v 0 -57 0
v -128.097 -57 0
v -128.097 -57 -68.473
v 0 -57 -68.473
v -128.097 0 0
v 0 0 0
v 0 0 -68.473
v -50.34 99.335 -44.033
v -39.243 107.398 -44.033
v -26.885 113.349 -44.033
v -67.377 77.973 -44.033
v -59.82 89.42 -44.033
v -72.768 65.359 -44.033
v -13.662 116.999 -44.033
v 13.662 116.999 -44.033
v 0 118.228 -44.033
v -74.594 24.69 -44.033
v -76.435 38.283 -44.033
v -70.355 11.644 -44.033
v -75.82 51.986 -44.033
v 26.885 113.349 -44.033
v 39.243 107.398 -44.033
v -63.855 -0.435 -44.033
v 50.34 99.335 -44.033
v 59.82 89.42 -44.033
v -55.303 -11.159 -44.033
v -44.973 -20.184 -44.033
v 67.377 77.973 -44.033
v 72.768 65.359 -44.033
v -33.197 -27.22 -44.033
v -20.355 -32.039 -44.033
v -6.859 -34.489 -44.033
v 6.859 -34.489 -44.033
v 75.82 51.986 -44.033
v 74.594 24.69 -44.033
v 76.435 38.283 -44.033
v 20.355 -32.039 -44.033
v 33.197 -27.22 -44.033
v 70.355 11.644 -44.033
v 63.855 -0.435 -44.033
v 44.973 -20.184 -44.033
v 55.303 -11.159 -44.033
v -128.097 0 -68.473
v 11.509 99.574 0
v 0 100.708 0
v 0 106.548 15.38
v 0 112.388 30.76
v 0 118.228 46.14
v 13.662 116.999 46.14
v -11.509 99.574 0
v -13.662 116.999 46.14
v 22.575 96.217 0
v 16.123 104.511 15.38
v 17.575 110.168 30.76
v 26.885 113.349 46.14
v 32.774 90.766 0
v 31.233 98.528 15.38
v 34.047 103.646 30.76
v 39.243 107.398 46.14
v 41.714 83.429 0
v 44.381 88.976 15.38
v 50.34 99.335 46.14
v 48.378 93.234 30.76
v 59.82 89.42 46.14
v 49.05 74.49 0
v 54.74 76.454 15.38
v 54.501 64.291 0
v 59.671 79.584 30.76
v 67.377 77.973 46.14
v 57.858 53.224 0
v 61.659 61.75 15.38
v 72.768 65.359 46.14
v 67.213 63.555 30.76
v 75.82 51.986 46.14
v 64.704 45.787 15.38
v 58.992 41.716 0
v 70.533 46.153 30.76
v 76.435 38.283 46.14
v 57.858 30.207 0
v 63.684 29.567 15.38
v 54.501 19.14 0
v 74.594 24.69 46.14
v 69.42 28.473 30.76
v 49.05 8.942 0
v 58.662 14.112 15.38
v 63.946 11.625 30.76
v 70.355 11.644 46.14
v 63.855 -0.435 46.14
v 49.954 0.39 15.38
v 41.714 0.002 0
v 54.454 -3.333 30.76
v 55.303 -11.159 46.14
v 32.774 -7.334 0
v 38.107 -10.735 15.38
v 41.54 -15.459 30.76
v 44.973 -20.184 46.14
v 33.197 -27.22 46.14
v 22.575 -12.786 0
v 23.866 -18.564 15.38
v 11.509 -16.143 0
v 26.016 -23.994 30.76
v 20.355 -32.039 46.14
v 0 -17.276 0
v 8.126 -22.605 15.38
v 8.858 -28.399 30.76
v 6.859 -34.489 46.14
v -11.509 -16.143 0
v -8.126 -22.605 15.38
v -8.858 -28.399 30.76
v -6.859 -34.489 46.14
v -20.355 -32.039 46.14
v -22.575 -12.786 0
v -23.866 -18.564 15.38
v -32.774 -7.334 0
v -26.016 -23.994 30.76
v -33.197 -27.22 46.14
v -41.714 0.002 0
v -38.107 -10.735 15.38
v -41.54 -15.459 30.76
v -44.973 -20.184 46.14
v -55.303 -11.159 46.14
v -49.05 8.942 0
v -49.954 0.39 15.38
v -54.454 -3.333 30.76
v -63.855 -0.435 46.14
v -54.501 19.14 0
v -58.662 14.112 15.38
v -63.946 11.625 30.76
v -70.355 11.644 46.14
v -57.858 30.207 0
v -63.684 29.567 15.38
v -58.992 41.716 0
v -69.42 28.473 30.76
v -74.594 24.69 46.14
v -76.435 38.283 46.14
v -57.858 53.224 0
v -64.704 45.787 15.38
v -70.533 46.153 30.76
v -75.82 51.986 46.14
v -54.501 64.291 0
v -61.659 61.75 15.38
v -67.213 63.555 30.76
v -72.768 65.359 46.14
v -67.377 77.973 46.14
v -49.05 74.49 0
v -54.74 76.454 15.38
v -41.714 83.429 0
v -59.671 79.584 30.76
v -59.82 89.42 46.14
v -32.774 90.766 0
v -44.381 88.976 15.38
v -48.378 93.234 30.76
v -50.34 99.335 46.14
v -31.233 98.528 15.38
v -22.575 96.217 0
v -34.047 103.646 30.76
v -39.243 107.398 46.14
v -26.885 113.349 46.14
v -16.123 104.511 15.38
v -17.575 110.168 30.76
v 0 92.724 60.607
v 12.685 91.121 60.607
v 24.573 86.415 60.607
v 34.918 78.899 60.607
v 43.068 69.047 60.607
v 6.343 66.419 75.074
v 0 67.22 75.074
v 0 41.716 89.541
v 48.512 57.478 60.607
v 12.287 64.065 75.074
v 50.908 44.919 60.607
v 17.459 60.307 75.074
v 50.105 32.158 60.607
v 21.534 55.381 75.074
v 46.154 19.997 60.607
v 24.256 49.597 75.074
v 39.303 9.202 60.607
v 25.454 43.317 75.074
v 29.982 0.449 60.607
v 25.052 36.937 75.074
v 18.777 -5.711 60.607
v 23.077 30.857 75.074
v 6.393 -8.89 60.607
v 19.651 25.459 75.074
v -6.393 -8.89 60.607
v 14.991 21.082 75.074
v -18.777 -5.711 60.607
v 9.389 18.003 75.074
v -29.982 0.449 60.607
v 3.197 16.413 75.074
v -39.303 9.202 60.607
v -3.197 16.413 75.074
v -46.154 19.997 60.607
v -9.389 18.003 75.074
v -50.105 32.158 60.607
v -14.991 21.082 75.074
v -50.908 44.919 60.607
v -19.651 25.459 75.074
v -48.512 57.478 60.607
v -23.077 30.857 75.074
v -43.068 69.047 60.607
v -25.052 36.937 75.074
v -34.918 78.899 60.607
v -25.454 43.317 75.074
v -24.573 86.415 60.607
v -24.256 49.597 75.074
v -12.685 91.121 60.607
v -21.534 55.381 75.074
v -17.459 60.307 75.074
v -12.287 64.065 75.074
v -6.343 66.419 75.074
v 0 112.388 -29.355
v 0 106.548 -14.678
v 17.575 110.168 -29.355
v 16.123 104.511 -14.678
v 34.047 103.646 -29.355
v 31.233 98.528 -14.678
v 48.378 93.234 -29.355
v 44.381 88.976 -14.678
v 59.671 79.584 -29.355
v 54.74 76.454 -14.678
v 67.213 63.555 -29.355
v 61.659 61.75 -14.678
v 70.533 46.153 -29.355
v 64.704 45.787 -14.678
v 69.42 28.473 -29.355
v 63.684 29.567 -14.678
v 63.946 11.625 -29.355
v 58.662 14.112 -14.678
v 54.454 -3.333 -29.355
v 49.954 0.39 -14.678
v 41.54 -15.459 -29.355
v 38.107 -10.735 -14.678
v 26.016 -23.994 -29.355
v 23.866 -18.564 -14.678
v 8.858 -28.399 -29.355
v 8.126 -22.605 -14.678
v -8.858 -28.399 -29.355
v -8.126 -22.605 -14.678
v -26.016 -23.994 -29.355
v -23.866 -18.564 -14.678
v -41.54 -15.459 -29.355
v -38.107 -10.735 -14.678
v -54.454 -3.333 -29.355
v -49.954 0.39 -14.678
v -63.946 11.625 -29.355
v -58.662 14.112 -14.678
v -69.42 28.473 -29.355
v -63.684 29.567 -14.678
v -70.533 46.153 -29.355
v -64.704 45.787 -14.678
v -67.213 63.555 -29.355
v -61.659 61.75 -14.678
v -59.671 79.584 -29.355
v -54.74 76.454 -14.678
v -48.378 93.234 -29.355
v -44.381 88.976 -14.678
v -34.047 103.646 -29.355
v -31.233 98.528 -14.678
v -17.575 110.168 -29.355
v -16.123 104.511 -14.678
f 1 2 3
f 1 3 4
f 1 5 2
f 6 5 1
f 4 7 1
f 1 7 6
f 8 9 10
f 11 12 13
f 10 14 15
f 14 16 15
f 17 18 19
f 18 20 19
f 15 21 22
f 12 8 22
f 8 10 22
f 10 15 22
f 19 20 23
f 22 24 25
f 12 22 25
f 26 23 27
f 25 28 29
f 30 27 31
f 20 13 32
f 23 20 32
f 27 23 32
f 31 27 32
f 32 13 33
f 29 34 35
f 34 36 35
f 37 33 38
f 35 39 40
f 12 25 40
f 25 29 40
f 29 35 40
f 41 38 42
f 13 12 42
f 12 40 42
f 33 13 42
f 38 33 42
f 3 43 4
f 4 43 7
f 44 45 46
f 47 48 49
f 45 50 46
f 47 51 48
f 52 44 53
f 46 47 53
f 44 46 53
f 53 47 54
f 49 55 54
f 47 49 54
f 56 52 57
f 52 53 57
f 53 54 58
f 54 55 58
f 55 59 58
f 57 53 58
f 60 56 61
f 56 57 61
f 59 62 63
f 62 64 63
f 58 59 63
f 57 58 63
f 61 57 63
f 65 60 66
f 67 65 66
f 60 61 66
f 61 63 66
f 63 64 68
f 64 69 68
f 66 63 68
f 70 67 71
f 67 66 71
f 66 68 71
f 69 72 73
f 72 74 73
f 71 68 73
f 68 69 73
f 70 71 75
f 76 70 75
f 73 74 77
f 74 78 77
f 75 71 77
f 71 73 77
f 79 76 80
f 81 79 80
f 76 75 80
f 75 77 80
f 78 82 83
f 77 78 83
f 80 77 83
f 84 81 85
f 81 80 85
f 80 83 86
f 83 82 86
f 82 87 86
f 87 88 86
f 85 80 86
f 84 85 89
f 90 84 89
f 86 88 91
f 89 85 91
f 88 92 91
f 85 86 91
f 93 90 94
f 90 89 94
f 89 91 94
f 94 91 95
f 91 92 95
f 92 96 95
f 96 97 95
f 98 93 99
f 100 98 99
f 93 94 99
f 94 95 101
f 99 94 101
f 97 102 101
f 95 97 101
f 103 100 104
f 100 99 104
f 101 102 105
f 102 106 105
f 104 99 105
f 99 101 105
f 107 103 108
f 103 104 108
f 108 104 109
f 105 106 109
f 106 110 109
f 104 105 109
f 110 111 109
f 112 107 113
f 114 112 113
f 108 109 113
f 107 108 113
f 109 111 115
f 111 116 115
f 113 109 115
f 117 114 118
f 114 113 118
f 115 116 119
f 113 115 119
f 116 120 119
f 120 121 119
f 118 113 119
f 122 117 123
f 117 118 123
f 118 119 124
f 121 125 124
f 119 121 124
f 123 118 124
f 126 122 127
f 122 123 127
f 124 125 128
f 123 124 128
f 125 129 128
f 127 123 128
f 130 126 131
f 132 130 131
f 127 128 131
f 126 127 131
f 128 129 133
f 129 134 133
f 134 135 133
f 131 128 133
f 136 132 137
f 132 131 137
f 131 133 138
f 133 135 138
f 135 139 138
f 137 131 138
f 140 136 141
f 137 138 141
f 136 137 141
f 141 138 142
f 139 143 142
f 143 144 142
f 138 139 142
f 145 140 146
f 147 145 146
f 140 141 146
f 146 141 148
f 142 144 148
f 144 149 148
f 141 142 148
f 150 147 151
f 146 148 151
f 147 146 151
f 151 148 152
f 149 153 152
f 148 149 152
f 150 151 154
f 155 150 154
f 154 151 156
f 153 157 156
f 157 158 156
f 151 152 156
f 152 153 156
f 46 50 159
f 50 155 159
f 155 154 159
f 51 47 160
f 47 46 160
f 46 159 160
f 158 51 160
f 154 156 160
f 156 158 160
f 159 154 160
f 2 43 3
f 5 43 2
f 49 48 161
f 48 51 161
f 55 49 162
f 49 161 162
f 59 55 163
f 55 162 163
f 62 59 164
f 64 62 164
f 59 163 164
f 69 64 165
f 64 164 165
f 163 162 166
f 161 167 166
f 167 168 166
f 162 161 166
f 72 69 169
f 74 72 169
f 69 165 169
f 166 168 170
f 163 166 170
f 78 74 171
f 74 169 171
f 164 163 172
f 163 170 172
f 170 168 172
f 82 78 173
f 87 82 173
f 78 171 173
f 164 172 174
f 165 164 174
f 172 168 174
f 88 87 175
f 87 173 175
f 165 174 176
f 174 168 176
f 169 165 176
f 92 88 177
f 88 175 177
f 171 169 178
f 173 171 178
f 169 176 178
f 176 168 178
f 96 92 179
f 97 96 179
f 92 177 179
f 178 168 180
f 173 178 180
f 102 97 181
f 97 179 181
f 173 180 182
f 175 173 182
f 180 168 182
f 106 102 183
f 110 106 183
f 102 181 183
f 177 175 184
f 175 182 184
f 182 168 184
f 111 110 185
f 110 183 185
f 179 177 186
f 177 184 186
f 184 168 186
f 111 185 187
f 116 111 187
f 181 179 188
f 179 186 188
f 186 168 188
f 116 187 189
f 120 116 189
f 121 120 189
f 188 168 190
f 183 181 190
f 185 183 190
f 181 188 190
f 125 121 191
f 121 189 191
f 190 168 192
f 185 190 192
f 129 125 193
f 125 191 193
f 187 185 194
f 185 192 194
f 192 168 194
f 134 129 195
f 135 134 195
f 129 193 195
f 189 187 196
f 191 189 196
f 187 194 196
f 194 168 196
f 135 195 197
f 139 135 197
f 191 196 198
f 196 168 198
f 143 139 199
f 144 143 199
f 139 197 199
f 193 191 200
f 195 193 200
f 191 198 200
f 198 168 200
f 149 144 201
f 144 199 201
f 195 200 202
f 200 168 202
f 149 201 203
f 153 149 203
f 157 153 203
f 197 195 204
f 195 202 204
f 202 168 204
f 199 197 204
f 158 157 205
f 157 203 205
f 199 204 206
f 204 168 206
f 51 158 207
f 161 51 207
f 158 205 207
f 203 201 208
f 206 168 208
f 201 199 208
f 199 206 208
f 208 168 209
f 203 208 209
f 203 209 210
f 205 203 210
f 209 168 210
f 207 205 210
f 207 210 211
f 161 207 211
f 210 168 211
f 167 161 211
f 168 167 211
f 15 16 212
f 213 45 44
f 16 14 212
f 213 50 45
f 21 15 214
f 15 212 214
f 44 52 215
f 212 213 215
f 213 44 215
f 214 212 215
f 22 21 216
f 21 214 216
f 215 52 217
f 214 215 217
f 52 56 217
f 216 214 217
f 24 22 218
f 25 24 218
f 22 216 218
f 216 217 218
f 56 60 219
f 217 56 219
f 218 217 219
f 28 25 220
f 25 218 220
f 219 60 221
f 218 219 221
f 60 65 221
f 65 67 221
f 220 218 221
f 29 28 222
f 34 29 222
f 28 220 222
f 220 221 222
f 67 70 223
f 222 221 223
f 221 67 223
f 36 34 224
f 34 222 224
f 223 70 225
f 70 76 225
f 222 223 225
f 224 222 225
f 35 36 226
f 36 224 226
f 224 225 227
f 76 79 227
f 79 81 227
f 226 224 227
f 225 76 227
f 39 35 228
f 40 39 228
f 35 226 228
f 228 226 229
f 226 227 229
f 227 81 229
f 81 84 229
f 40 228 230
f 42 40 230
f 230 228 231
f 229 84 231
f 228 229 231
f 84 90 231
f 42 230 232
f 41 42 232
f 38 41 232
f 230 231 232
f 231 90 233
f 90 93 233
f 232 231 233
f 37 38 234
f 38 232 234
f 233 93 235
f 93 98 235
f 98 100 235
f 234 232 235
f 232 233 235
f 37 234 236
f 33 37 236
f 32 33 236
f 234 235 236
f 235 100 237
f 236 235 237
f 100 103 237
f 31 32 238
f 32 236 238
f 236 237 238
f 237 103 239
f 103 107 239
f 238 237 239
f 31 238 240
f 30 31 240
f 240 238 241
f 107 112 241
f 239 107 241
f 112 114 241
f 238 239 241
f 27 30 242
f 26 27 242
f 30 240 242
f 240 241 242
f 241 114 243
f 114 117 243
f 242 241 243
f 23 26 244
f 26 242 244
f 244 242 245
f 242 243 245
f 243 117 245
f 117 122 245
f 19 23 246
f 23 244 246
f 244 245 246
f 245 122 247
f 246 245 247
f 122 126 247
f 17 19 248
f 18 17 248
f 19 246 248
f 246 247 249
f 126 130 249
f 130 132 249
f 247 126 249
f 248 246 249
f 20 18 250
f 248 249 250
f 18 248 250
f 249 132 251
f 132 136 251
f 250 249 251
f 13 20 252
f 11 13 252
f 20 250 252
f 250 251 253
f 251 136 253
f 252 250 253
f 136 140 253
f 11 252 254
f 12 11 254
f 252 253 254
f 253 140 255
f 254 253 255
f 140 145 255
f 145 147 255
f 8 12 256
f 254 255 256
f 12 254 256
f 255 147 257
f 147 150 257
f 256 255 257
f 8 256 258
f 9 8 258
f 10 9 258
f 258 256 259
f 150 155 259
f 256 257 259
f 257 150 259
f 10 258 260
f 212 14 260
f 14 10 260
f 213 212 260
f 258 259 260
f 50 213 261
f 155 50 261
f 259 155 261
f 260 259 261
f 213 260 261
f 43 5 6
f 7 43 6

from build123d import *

# Parameters (mm, degrees)
F0_W     = 128.096625
F0_H     = 68.472706
F1_DEPTH = 57


with BuildPart() as f1:
    # F0 (on Front) → F1 (new body)
    with BuildSketch(Plane.XZ):
        with Locations((-64.048312, -34.236353)):
            Rectangle(F0_W, F0_H)
    extrude(amount=F1_DEPTH)


with BuildPart() as f3:
    # F2 (on Right) → F3 (revolve)
    with BuildSketch(Plane.YZ):
        Polygon((118.228109, 46.140071), (41.715678, 89.541227), (41.715678, -44.033214), (118.228109, -44.033214), (100.707546, 0), align=None)
    revolve(axis=Axis((0, 41.715678, 22.754006), (0, 0, -1)))


solid = Compound([f1.part, f3.part])
